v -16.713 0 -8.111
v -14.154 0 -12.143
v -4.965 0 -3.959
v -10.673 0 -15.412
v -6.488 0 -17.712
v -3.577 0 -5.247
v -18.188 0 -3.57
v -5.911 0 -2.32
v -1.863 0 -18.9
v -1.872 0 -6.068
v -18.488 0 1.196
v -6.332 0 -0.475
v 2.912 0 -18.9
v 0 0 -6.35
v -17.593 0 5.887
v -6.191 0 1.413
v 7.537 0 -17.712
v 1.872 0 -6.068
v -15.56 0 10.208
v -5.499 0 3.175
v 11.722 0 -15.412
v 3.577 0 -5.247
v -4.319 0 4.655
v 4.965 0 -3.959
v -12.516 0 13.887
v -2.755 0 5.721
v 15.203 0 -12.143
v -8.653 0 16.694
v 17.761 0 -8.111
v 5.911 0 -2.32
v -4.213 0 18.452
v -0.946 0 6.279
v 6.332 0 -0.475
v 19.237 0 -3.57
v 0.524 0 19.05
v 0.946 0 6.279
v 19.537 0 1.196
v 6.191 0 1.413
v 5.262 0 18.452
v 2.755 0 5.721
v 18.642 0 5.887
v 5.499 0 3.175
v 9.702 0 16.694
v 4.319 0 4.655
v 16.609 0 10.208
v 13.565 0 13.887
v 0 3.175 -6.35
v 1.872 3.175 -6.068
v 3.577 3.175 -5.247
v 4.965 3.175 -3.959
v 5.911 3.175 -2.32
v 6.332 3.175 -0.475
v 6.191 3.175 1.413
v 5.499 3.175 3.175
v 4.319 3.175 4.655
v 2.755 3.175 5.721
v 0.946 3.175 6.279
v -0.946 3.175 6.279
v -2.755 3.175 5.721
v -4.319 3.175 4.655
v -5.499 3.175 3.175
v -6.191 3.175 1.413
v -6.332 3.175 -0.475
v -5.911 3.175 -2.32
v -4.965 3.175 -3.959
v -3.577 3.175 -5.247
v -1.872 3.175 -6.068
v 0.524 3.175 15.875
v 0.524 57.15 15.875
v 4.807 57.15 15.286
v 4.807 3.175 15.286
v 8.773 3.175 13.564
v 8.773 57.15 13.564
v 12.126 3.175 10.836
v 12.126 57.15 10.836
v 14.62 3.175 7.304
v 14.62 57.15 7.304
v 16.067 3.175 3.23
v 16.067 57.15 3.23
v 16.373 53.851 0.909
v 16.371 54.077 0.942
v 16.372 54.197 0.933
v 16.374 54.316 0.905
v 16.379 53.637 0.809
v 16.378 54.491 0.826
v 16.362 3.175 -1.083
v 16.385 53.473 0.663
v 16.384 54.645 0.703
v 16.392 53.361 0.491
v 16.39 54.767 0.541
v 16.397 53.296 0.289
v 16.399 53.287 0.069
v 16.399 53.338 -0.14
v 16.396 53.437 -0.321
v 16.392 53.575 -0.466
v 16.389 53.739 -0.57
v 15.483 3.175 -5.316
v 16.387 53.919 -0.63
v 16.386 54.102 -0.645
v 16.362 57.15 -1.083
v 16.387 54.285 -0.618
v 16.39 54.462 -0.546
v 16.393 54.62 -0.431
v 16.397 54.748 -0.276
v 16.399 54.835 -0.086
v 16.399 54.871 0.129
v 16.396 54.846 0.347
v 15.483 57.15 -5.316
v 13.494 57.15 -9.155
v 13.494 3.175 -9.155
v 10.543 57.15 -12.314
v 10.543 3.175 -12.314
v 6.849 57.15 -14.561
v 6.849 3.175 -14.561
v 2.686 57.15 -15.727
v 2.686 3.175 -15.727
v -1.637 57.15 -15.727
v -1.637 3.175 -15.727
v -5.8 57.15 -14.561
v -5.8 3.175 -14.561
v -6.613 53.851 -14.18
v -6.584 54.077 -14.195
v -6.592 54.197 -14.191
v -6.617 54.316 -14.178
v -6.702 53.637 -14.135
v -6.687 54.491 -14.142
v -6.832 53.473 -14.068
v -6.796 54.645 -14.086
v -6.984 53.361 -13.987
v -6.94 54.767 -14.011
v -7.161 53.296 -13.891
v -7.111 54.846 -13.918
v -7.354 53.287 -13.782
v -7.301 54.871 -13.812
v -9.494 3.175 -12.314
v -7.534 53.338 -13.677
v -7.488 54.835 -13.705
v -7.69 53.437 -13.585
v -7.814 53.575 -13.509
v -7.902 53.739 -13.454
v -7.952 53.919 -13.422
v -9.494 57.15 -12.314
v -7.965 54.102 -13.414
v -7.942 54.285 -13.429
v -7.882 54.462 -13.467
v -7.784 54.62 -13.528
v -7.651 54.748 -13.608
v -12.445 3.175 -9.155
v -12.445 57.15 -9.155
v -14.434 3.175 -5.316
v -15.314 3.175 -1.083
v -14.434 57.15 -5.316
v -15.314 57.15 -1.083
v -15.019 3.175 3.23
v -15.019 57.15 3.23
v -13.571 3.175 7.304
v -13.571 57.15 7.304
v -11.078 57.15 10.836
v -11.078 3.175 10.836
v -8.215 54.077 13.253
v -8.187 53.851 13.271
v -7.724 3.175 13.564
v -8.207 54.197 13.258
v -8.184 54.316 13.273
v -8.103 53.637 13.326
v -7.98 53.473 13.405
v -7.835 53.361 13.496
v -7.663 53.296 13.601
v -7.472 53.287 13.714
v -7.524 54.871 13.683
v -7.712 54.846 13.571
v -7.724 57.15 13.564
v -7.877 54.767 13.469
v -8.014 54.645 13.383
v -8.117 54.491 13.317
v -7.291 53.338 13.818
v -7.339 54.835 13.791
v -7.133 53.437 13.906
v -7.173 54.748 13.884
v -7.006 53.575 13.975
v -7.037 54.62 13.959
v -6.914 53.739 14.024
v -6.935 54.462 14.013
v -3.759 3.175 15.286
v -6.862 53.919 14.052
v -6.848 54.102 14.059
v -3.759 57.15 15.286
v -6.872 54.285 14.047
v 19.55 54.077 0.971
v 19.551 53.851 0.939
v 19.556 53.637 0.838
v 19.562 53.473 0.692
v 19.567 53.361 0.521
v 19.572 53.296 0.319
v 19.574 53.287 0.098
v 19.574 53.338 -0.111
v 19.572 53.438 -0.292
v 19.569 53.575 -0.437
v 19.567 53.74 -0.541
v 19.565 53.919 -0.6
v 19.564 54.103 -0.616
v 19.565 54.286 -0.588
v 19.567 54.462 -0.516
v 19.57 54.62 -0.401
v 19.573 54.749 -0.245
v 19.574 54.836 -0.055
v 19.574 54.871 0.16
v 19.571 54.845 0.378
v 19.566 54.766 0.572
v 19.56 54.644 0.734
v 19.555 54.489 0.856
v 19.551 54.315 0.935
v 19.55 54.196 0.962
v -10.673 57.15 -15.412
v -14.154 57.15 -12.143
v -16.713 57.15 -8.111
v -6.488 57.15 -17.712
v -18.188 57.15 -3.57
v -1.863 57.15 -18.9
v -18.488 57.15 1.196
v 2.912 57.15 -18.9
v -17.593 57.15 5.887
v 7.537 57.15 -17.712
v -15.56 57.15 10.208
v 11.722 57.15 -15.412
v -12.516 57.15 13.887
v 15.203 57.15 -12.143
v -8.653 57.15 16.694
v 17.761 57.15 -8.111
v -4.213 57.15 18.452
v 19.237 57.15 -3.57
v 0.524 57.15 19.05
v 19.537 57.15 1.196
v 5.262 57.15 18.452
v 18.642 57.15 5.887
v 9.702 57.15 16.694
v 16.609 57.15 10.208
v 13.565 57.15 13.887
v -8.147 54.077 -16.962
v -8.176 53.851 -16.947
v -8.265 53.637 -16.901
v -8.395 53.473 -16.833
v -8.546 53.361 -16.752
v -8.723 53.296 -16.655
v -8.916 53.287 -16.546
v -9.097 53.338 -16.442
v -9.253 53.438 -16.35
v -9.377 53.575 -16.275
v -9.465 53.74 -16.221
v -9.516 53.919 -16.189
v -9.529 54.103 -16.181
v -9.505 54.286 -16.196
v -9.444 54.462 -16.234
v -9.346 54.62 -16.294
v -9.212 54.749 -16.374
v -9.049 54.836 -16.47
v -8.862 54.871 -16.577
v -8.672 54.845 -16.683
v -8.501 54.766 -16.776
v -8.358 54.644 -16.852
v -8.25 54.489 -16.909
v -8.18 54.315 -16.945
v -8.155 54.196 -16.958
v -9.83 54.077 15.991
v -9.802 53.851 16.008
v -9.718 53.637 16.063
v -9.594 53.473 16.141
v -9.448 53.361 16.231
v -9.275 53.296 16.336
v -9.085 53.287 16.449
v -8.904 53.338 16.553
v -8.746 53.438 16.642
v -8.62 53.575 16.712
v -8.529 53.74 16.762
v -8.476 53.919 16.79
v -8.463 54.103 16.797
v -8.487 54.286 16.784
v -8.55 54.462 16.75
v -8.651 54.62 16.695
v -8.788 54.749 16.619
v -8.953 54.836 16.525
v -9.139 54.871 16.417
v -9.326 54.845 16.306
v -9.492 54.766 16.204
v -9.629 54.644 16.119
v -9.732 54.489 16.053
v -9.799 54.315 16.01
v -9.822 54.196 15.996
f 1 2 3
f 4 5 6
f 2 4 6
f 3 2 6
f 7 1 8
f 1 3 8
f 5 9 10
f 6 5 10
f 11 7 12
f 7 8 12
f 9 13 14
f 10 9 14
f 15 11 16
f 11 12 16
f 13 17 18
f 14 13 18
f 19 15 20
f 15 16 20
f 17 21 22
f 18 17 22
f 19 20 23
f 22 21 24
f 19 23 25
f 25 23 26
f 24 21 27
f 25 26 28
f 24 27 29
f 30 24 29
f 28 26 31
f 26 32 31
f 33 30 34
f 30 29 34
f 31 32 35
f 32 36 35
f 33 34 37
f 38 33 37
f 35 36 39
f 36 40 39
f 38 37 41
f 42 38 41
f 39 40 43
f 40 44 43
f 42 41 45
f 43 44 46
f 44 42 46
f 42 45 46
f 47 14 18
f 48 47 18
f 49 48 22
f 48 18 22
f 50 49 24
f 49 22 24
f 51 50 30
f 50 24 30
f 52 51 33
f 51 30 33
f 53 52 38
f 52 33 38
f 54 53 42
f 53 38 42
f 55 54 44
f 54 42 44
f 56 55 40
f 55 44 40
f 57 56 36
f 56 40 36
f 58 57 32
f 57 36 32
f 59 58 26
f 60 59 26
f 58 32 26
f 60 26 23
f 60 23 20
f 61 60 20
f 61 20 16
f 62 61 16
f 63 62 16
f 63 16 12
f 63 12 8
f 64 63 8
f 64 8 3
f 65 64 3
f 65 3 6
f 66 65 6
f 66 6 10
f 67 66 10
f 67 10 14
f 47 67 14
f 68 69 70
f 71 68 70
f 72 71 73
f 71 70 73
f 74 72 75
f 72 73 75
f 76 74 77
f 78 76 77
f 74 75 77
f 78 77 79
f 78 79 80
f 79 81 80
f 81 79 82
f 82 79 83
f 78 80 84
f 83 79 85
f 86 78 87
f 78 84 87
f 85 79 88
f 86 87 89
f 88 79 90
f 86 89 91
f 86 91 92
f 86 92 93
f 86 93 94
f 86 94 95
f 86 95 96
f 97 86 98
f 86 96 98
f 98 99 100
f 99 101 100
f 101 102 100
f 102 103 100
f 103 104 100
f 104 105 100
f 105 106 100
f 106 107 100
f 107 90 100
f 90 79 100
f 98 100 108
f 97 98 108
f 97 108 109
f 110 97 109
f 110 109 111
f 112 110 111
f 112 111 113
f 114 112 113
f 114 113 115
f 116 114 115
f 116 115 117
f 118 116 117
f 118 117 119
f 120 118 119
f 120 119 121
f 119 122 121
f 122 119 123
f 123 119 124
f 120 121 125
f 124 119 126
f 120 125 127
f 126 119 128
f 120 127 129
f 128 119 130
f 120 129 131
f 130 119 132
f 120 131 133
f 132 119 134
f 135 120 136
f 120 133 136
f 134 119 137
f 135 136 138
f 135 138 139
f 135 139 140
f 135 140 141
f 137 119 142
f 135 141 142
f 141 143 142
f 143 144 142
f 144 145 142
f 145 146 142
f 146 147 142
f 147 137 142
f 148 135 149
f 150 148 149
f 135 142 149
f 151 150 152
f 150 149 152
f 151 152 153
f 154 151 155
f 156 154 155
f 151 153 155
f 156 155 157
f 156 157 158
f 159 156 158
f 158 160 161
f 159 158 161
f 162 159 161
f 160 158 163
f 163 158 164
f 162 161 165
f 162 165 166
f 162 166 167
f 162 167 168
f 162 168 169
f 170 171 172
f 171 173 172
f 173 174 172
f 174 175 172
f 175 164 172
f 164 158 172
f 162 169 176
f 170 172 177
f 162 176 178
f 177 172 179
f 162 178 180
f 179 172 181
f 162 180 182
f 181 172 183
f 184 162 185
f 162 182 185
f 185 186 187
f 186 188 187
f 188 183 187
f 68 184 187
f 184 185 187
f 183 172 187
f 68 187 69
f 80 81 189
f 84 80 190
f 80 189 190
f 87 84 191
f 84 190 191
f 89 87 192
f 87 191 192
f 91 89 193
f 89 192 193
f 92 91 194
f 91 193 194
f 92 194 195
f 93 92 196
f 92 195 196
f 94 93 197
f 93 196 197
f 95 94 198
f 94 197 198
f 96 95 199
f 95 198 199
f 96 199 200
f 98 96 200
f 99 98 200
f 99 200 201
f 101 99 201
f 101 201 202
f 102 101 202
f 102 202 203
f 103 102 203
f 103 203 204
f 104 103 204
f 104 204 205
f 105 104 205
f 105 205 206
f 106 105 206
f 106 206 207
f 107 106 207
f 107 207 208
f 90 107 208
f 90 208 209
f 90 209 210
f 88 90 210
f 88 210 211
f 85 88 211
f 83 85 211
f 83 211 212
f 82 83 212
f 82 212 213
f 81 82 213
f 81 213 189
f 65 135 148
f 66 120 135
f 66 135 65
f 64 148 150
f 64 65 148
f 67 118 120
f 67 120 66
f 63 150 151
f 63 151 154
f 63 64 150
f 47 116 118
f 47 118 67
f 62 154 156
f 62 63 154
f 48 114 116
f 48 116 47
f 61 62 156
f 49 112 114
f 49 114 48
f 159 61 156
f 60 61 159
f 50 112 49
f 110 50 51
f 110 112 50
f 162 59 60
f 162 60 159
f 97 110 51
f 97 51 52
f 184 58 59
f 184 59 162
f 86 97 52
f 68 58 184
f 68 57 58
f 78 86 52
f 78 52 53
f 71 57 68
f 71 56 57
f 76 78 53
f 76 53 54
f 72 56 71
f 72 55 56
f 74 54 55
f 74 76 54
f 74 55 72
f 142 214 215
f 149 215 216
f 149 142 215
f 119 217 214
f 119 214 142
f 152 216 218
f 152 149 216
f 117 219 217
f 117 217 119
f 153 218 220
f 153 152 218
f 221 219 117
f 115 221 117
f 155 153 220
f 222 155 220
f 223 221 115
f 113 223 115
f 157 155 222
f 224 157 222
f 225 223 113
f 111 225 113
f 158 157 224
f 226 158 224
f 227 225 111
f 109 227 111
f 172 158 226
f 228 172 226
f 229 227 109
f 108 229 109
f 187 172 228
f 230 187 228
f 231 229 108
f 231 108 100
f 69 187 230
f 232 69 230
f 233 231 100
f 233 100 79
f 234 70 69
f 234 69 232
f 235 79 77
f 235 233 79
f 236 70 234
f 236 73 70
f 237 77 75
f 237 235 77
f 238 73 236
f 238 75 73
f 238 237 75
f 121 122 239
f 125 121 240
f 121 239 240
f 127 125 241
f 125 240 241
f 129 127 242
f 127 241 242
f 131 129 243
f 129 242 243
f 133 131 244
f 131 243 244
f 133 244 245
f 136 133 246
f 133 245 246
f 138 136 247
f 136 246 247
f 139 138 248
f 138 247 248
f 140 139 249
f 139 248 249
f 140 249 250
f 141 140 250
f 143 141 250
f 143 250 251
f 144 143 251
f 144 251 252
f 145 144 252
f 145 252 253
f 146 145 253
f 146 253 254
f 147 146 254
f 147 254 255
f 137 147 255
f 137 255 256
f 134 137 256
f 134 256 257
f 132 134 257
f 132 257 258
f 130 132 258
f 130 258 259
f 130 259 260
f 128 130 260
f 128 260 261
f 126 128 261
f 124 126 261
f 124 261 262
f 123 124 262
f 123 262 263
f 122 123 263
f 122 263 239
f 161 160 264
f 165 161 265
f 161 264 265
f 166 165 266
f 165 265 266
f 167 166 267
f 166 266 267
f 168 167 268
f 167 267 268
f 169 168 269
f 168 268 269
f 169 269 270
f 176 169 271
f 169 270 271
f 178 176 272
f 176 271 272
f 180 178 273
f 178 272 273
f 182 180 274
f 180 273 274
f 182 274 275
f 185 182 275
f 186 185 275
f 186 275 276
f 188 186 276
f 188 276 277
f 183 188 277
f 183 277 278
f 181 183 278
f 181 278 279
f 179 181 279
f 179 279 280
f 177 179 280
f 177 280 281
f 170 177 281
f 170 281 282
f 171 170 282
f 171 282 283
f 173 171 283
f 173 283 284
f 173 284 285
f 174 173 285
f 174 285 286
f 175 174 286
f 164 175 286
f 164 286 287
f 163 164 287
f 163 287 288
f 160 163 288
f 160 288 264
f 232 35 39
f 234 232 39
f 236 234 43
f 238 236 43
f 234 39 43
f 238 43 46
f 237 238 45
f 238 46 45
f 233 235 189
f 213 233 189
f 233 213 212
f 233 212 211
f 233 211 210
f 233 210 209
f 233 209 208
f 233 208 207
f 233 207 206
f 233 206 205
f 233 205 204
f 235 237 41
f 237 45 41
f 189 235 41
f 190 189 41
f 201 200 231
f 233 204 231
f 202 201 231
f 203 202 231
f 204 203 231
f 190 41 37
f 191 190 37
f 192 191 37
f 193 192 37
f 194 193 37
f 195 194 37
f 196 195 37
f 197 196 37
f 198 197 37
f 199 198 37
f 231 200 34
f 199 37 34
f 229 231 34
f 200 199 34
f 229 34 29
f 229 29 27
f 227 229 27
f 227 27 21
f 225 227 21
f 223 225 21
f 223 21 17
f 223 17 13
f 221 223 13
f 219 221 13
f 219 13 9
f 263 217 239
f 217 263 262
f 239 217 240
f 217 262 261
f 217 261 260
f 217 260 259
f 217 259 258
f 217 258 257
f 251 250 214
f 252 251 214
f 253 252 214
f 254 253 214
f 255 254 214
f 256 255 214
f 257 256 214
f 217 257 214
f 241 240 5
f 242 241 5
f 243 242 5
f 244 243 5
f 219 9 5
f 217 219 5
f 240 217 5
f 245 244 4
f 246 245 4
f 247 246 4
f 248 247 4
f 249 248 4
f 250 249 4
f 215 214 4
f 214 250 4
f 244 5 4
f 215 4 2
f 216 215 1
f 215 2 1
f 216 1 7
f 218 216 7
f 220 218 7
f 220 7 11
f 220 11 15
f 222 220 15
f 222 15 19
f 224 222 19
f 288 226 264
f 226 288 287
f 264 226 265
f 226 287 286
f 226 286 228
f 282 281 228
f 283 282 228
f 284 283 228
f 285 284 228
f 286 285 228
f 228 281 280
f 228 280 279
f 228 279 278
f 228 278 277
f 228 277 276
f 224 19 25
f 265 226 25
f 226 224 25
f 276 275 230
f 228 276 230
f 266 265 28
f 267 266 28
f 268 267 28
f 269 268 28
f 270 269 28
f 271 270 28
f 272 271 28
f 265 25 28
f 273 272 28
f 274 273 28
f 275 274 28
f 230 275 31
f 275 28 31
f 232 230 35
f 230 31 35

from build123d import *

# Parameters (mm, degrees)
SKETCH1_R                          = 19.05
BOSS_EXTRUDE1_DEPTH                = 57.15
SKETCH2_R                          = 15.875
CUT_EXTRUDE1_DEPTH                 = 53.975
SKETCH3_R                          = 6.35
CUT_EXTRUDE2_DEPTH                 = 48.26
F_1_16_0_0625_DIAMETER_HOLE1_D     = 1.5875
F_1_16_0_0625_DIAMETER_HOLE1_DEPTH = 13.97
CIRPATTERN1_COUNT                  = 3


with BuildPart() as part:
    # Sketch1 → Boss-Extrude1 (new body)
    with BuildSketch(Plane(origin=(0, 0, 0), x_dir=(1, 0, 0), z_dir=(0, 1, 0))):
        with Locations(Location((0.524325323, 0, 0), (0, 0, 270))):
            Circle(SKETCH1_R)
    extrude(amount=BOSS_EXTRUDE1_DEPTH)

    # Sketch2 → Cut-Extrude1 (cut)
    with BuildSketch(Plane(origin=(0, 57.15, 0), x_dir=(1, 0, 0), z_dir=(0, 1, 0))):
        with Locations(Location((0.524325323, 0, 0), (0, 0, 270))):
            Circle(SKETCH2_R)
    extrude(amount=-CUT_EXTRUDE1_DEPTH, mode=Mode.SUBTRACT)

    # Sketch3 → Cut-Extrude2 (cut)
    with BuildSketch(Plane(origin=(0, 0, 0), x_dir=(-1, 0, 0), z_dir=(0, -1, 0))):
        with Locations(Location((0, 0, 0), (0, 0, 90))):
            Circle(SKETCH3_R)
    extrude(amount=-CUT_EXTRUDE2_DEPTH, mode=Mode.SUBTRACT)

    # 1/16 (0.0625) Diameter Hole1
    with Locations(Plane(origin=(16.398633507, 54.077107179, 0.148204826), x_dir=(0.009335737046, 0, -0.999956421057), z_dir=(-0.999956421057, 0, -0.009335737046))):
        with Locations((0, 0)):
            f_1_16_0_0625_diameter_hole1 = Hole(F_1_16_0_0625_DIAMETER_HOLE1_D / 2, depth=F_1_16_0_0625_DIAMETER_HOLE1_DEPTH)

    # CirPattern1: 1/16 (0.0625) Diameter Hole1 ×3 about axis
    cirpattern1_axis = Axis((0.524325323, 57.15, 0), (0, -1, 0))
    for i in range(1, CIRPATTERN1_COUNT):
        add(f_1_16_0_0625_diameter_hole1.rotate(cirpattern1_axis, i * 360 / CIRPATTERN1_COUNT), mode=Mode.SUBTRACT)


solid = part.part
